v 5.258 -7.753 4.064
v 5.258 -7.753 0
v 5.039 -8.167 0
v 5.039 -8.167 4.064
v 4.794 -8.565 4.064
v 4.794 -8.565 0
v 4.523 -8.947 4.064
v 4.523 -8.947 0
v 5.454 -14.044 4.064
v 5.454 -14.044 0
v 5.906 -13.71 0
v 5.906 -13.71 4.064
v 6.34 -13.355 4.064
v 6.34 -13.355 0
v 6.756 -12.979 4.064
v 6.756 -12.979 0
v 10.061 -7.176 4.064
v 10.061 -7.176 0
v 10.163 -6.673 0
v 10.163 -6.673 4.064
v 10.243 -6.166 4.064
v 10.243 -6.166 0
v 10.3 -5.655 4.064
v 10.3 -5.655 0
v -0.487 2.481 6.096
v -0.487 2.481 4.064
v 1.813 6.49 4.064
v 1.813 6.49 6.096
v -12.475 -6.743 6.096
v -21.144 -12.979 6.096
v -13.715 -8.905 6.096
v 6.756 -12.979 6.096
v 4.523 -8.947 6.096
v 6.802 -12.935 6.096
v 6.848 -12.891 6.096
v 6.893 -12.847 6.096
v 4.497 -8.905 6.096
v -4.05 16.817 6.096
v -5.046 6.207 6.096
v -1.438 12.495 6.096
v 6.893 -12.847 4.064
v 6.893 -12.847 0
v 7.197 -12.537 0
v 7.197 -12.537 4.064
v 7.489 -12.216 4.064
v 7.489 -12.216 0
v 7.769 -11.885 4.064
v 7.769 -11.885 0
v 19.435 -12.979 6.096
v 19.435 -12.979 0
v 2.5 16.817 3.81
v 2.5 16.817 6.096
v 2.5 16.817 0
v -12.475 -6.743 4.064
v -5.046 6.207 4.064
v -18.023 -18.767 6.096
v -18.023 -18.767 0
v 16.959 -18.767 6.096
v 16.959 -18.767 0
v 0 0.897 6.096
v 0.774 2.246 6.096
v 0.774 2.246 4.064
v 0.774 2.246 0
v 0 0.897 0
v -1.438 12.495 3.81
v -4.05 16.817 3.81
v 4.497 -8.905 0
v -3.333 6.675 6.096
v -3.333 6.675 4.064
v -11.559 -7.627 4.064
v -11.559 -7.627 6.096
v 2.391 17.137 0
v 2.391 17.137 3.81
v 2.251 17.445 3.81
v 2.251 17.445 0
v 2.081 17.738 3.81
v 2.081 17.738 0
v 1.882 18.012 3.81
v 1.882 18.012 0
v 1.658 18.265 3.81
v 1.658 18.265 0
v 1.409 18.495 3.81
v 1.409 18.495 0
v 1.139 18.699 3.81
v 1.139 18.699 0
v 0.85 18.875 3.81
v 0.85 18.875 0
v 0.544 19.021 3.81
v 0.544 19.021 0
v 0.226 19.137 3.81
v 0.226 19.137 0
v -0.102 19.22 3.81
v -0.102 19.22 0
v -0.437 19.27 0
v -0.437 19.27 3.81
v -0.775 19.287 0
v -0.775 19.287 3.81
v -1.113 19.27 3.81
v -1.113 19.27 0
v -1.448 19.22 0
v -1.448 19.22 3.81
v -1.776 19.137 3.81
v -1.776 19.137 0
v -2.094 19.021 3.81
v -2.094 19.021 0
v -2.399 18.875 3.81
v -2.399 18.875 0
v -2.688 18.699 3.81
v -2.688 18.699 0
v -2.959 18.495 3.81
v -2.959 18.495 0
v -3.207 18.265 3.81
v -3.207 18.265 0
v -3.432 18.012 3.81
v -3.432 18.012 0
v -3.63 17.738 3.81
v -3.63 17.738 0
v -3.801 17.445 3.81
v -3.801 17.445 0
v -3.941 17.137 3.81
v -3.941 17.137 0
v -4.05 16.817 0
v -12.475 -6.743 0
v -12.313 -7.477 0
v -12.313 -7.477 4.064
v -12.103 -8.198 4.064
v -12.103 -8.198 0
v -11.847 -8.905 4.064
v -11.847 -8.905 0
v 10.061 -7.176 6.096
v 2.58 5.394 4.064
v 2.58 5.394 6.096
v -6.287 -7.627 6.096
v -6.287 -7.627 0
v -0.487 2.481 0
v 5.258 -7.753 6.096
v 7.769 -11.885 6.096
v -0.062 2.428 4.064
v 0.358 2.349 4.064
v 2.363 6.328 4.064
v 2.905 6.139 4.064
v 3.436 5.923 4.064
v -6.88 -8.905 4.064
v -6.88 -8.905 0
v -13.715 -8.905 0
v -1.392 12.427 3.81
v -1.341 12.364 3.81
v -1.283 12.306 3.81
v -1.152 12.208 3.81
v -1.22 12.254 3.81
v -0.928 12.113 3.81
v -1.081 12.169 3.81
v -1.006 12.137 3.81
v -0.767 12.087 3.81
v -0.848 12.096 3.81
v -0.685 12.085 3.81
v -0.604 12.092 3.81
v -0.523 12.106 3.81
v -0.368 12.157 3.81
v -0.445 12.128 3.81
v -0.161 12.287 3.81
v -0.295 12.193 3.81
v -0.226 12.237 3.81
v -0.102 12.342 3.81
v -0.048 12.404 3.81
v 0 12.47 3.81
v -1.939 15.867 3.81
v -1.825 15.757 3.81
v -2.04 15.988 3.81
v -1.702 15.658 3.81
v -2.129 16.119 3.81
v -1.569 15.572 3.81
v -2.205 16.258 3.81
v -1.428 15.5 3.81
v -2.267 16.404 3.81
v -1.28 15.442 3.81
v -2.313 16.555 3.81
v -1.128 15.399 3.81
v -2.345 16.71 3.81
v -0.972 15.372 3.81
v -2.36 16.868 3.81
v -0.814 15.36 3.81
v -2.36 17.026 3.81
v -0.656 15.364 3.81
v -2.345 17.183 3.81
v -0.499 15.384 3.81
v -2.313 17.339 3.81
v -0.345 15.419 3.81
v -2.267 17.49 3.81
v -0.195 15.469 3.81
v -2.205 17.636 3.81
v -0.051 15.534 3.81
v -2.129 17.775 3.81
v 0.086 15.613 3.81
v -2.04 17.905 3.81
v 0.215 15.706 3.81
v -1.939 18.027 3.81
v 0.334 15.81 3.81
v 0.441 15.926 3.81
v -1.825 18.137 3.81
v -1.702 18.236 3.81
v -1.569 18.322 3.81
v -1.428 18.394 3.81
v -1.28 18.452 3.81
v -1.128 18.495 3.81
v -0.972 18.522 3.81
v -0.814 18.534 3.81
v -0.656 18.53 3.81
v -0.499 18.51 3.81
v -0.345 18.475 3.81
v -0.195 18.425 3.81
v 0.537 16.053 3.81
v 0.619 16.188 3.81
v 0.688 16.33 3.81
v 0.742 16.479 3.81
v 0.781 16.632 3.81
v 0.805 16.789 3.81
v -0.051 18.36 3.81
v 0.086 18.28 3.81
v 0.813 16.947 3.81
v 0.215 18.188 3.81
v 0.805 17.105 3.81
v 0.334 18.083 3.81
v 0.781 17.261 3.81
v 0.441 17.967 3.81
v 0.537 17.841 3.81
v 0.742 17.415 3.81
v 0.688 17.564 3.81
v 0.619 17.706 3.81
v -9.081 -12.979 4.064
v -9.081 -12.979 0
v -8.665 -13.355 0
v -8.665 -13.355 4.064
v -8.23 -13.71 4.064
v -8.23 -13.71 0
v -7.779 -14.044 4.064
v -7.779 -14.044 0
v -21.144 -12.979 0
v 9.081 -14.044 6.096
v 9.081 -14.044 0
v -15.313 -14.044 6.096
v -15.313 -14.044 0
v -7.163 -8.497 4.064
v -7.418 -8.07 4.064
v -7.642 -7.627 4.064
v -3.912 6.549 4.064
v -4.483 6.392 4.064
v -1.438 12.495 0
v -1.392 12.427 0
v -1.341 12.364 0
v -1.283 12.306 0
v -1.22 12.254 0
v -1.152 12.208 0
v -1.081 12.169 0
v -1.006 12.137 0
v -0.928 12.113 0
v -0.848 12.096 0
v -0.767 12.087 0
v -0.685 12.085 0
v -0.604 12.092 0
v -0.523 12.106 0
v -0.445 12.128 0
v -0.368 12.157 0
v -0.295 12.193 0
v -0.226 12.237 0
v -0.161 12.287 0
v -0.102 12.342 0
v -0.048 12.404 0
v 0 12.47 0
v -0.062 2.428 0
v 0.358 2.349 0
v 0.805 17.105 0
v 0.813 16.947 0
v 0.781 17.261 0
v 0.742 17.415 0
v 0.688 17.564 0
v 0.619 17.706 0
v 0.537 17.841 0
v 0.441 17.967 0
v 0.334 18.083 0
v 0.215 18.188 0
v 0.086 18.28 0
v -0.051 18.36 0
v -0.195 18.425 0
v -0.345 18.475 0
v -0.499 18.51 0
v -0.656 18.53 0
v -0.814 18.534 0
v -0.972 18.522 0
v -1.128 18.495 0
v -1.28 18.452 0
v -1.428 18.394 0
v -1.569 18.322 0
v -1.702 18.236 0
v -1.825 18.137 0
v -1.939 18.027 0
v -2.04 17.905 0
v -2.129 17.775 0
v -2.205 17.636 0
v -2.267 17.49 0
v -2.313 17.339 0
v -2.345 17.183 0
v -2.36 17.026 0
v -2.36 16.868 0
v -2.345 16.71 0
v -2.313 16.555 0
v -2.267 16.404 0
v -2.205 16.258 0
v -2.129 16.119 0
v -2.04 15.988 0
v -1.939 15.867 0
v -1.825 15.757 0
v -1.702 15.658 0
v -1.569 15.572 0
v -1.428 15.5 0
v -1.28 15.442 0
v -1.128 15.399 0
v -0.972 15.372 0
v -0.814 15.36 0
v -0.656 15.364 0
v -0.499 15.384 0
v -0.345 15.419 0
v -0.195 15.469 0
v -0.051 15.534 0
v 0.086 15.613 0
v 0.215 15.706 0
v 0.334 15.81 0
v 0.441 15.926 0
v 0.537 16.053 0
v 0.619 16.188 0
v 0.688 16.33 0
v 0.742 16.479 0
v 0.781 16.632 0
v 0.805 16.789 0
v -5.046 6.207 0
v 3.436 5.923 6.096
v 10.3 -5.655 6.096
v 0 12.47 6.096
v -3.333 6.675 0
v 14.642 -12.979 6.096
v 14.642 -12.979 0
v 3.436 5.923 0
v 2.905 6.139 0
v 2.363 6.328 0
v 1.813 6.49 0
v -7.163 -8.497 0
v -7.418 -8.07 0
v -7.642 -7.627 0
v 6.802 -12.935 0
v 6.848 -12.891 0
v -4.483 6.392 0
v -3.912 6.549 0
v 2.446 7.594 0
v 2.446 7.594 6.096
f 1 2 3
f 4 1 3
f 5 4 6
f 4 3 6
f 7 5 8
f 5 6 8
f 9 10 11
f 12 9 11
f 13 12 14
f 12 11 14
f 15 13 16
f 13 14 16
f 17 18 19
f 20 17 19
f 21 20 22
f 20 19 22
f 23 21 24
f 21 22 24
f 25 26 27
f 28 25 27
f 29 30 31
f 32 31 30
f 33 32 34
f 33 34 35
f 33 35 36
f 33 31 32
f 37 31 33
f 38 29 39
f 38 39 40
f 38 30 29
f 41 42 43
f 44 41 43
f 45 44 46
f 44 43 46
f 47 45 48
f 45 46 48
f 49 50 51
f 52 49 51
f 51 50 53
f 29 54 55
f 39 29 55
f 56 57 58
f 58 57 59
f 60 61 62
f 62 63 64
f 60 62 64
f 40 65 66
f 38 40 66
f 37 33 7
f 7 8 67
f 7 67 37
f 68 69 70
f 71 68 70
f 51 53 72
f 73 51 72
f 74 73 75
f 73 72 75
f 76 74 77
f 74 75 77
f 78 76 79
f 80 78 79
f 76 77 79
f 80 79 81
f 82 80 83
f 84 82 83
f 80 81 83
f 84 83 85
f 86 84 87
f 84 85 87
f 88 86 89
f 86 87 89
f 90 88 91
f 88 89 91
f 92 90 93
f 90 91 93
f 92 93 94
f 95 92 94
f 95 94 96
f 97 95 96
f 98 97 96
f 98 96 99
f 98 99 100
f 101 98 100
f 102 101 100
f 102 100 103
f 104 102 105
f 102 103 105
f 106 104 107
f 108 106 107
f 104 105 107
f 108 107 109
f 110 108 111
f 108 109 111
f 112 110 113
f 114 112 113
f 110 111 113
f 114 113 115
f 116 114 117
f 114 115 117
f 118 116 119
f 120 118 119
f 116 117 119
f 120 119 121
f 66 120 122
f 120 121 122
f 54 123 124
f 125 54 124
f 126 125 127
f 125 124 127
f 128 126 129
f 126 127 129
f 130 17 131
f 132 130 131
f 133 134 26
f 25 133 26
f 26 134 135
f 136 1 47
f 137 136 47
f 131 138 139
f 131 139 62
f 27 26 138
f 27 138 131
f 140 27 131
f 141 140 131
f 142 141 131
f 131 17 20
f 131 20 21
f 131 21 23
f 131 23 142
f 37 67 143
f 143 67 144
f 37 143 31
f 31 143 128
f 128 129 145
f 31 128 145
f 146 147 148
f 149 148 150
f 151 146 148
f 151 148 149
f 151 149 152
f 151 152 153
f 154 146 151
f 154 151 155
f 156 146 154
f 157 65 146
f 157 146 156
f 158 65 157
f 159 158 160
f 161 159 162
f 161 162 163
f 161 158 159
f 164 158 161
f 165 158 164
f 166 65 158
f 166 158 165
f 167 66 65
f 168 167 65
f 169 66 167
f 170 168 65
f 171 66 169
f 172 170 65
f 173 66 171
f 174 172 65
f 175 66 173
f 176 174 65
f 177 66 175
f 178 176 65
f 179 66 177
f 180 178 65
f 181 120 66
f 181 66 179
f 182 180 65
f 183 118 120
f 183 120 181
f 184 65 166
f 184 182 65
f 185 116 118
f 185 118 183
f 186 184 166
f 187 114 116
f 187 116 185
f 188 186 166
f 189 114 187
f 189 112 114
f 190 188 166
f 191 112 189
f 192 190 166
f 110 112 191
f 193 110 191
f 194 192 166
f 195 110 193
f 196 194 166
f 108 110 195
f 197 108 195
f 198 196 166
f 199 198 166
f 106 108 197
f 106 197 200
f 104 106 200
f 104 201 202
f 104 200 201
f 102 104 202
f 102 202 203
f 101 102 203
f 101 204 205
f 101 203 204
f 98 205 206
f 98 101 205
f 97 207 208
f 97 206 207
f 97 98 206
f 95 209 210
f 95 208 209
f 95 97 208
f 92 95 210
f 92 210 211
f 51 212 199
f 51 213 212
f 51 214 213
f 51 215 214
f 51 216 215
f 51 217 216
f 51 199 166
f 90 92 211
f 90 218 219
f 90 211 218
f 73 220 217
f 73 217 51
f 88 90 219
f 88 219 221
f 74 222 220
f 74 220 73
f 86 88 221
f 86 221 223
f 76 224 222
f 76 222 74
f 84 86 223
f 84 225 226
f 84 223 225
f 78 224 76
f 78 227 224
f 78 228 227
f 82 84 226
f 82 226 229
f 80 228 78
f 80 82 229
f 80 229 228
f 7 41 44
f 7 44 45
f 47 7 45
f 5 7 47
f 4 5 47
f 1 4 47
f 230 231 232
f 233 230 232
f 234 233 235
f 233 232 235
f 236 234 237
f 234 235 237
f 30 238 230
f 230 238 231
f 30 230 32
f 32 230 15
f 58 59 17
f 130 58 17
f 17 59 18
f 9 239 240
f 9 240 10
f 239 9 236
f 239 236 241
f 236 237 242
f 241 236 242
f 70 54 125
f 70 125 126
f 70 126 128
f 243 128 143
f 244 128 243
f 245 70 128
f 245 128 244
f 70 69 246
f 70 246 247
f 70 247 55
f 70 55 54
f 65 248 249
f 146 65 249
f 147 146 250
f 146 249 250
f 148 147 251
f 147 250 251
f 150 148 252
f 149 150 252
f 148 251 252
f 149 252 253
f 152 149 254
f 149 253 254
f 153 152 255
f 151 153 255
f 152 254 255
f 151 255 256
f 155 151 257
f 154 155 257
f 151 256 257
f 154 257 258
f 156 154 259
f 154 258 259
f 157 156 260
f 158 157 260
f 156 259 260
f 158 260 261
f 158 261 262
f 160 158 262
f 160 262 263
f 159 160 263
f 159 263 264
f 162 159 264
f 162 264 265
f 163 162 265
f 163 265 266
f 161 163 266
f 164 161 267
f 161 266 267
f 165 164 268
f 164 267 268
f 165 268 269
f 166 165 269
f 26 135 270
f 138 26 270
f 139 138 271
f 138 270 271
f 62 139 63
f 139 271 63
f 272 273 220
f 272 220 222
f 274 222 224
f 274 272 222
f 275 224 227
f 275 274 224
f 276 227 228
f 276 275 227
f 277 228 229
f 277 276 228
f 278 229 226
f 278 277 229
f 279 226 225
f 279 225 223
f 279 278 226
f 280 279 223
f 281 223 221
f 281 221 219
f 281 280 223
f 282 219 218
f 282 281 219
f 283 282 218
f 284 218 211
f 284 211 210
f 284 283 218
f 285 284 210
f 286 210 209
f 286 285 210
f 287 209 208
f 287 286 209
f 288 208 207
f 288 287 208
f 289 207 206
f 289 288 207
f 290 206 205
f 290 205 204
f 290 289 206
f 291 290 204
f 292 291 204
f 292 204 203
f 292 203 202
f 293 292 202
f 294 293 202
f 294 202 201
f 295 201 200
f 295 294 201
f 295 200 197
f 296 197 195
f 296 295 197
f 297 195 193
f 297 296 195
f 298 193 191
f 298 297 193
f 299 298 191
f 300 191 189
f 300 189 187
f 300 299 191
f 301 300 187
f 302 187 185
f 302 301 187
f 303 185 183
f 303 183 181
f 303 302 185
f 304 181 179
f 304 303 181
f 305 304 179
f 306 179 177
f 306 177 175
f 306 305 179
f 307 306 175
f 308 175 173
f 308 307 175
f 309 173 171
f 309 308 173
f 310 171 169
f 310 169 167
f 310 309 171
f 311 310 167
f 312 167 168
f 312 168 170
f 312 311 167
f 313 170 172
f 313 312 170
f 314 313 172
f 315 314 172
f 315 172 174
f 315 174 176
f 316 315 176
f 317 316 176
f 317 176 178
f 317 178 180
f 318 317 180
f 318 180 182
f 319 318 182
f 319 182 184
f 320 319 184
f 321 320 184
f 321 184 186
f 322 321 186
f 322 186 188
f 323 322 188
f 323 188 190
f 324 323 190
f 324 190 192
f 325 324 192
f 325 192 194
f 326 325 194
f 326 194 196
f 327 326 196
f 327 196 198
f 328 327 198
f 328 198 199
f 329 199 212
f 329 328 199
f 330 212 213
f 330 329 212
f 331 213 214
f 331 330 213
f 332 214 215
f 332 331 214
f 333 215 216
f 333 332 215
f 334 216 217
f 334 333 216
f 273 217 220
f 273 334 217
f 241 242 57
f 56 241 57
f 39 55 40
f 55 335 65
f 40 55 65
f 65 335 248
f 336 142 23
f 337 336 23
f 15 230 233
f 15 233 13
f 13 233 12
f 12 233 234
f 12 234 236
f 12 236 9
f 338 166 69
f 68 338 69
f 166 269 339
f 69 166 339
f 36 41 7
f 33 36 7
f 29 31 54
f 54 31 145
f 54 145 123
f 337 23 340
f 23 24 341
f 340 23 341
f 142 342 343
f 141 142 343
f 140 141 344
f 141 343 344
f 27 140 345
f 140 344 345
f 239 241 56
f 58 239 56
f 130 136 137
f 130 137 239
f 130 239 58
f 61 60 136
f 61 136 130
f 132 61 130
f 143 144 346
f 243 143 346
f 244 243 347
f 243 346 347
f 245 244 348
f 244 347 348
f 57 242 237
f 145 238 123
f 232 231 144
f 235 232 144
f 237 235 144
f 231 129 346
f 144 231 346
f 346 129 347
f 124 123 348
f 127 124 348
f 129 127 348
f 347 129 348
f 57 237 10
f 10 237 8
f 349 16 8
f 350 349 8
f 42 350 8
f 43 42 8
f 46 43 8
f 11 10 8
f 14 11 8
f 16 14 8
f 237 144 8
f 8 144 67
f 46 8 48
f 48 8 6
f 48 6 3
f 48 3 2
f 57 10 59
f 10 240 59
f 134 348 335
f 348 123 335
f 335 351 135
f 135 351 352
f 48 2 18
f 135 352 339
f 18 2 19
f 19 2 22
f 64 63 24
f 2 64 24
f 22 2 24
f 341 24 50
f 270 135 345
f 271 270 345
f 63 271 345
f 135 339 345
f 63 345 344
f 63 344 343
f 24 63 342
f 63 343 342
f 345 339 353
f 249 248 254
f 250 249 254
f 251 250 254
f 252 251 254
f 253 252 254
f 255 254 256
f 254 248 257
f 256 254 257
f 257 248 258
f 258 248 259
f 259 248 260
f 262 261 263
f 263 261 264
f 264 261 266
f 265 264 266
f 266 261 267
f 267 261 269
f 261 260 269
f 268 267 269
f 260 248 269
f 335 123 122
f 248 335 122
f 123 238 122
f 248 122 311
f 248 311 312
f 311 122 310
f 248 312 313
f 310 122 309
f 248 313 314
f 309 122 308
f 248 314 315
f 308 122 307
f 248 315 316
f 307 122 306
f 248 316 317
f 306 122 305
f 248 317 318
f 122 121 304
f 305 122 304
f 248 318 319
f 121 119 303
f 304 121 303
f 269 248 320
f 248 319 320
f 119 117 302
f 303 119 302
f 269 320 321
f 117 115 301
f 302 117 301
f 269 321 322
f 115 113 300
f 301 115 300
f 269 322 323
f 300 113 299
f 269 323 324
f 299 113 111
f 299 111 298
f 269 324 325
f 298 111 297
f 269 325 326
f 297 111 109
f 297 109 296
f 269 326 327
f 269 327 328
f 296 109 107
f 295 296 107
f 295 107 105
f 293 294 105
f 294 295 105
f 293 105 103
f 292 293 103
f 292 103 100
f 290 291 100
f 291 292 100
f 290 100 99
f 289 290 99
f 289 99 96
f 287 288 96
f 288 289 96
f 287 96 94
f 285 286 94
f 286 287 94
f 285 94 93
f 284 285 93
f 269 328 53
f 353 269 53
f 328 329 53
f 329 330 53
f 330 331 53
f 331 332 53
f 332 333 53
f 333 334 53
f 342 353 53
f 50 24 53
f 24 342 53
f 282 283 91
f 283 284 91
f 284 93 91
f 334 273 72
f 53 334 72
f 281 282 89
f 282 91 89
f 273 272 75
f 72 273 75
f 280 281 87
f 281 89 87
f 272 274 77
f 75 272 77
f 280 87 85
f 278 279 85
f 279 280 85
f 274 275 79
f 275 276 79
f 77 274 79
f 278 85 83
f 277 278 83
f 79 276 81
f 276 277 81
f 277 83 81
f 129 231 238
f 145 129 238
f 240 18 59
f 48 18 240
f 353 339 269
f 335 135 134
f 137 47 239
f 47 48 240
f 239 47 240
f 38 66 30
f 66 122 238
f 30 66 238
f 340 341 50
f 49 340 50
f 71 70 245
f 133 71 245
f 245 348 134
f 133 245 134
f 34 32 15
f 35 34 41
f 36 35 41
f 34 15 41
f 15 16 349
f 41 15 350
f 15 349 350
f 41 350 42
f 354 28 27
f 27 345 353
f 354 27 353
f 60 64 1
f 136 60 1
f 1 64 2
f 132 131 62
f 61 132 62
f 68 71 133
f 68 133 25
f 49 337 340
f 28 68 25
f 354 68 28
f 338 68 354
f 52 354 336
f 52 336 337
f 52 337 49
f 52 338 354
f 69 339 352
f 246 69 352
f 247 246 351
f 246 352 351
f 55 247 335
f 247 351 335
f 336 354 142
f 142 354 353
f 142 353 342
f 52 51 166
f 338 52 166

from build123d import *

# Parameters (mm, degrees)
F1_DEPTH = 4.064
F2_DEPTH = 6.096
F0_R     = 1.5875
F3_DEPTH = 3.81


with BuildPart() as f1:
    # F0 (on Top) → F1 (new body)
    with BuildSketch(Plane.XY):
        with BuildLine():
            ThreePointArc((-3.332805, 6.675153), (-4.198232, 6.474047), (-5.045567, 6.206779))
            Line((-5.045567, 6.206779), (-12.475147, -6.74291))
            ThreePointArc((-12.475147, -6.74291), (-12.213975, -7.839217), (-11.84683, -8.904723))
            Line((-11.84683, -8.904723), (-6.879852, -8.904723))
            ThreePointArc((-6.879852, -8.904723), (-7.2945, -8.285602), (-7.642369, -7.626641))
            Line((-7.642369, -7.626641), (-11.558674, -7.626641))
            Line((-11.558674, -7.626641), (-3.332805, 6.675153))
        make_face()
        with BuildLine():
            ThreePointArc((10.060523, -7.176114), (10.205887, -6.419697), (10.300328, -5.655252))
            Line((10.300328, -5.655252), (3.436154, 5.922969))
            ThreePointArc((3.436154, 5.922969), (2.635064, 6.237061), (1.812747, 6.490423))
            Line((1.812747, 6.490423), (-0.487404, 2.481281))
            ThreePointArc((-0.487404, 2.481281), (0.148569, 2.391873), (0.773937, 2.245683))
            Line((0.773937, 2.245683), (2.580103, 5.393814))
            Line((2.580103, 5.393814), (10.060523, -7.176114))
        make_face()
        with BuildLine():
            Line((4.522967, -8.947072), (6.893241, -12.846554))
            ThreePointArc((6.893241, -12.846554), (7.344862, -12.378173), (7.769292, -11.885019))
            Line((7.769292, -11.885019), (5.257529, -7.752765))
            ThreePointArc((5.257529, -7.752765), (4.919634, -8.367992), (4.522967, -8.947072))
        make_face()
        with BuildLine():
            Line((6.756257, -12.978608), (-9.081211, -12.978608))
            ThreePointArc((-9.081211, -12.978608), (-8.44977, -13.534932), (-7.779364, -14.043628))
            Line((-7.779364, -14.043628), (5.45441, -14.043628))
            ThreePointArc((5.45441, -14.043628), (6.124816, -13.534932), (6.756257, -12.978608))
        make_face()
    extrude(amount=F1_DEPTH)

    # F0 (on Top) → F2 (join)
    with BuildSketch(Plane.XY):
        with BuildLine():
            Line((-1.438017, 12.494705), (-4.049945, 16.816666))
            Line((-4.049945, 16.816666), (-21.144284, -12.978608))
            Line((-21.144284, -12.978608), (-9.081211, -12.978608))
            Line((-9.081211, -12.978608), (6.756257, -12.978608))
            ThreePointArc((6.756257, -12.978608), (6.825022, -12.912864), (6.893241, -12.846554))
            Line((6.893241, -12.846554), (4.522967, -8.947072))
            Line((4.522967, -8.947072), (4.497225, -8.904723))
            Line((4.497225, -8.904723), (-6.879852, -8.904723))
            Line((-6.879852, -8.904723), (-11.84683, -8.904723))
            Line((-11.84683, -8.904723), (-13.715436, -8.904723))
            Line((-13.715436, -8.904723), (-12.475147, -6.74291))
            Line((-12.475147, -6.74291), (-5.045567, 6.206779))
            Line((-5.045567, 6.206779), (-1.438017, 12.494705))
        make_face()
        Polygon((19.434802, -12.978608), (2.500223, 16.816666), (0, 12.469688), (-3.332805, 6.675153), (-11.558674, -7.626641), (-7.642369, -7.626641), (-6.286587, -7.626641), (-0.487404, 2.481281), (1.812747, 6.490423), (2.445692, 7.59364), (3.436154, 5.922969), (10.300328, -5.655252), (14.641996, -12.978608), align=None)
        Polygon((5.45441, -14.043628), (-7.779364, -14.043628), (-15.313038, -14.043628), (-18.023162, -18.767349), (16.95852, -18.767349), (10.060523, -7.176114), (2.580103, 5.393814), (0.773937, 2.245683), (0, 0.896719), (5.257529, -7.752765), (7.769292, -11.885019), (9.081388, -14.043628), align=None)
    extrude(amount=F2_DEPTH)

    # F0 (on Top) → F3 (join)
    with BuildSketch(Plane.XY):
        with BuildLine():
            ThreePointArc((2.500223, 16.816666), (-0.774861, 19.287277), (-4.049945, 16.816666))
            Line((-4.049945, 16.816666), (-1.438017, 12.494705))
            ThreePointArc((-1.438017, 12.494705), (-0.725922, 12.084814), (0, 12.469688))
            Line((0, 12.469688), (2.500223, 16.816666))
        make_face()
        with Locations((-0.774861, 16.946895)):
            Circle(F0_R, mode=Mode.SUBTRACT)
    extrude(amount=F3_DEPTH)


solid = f1.part
